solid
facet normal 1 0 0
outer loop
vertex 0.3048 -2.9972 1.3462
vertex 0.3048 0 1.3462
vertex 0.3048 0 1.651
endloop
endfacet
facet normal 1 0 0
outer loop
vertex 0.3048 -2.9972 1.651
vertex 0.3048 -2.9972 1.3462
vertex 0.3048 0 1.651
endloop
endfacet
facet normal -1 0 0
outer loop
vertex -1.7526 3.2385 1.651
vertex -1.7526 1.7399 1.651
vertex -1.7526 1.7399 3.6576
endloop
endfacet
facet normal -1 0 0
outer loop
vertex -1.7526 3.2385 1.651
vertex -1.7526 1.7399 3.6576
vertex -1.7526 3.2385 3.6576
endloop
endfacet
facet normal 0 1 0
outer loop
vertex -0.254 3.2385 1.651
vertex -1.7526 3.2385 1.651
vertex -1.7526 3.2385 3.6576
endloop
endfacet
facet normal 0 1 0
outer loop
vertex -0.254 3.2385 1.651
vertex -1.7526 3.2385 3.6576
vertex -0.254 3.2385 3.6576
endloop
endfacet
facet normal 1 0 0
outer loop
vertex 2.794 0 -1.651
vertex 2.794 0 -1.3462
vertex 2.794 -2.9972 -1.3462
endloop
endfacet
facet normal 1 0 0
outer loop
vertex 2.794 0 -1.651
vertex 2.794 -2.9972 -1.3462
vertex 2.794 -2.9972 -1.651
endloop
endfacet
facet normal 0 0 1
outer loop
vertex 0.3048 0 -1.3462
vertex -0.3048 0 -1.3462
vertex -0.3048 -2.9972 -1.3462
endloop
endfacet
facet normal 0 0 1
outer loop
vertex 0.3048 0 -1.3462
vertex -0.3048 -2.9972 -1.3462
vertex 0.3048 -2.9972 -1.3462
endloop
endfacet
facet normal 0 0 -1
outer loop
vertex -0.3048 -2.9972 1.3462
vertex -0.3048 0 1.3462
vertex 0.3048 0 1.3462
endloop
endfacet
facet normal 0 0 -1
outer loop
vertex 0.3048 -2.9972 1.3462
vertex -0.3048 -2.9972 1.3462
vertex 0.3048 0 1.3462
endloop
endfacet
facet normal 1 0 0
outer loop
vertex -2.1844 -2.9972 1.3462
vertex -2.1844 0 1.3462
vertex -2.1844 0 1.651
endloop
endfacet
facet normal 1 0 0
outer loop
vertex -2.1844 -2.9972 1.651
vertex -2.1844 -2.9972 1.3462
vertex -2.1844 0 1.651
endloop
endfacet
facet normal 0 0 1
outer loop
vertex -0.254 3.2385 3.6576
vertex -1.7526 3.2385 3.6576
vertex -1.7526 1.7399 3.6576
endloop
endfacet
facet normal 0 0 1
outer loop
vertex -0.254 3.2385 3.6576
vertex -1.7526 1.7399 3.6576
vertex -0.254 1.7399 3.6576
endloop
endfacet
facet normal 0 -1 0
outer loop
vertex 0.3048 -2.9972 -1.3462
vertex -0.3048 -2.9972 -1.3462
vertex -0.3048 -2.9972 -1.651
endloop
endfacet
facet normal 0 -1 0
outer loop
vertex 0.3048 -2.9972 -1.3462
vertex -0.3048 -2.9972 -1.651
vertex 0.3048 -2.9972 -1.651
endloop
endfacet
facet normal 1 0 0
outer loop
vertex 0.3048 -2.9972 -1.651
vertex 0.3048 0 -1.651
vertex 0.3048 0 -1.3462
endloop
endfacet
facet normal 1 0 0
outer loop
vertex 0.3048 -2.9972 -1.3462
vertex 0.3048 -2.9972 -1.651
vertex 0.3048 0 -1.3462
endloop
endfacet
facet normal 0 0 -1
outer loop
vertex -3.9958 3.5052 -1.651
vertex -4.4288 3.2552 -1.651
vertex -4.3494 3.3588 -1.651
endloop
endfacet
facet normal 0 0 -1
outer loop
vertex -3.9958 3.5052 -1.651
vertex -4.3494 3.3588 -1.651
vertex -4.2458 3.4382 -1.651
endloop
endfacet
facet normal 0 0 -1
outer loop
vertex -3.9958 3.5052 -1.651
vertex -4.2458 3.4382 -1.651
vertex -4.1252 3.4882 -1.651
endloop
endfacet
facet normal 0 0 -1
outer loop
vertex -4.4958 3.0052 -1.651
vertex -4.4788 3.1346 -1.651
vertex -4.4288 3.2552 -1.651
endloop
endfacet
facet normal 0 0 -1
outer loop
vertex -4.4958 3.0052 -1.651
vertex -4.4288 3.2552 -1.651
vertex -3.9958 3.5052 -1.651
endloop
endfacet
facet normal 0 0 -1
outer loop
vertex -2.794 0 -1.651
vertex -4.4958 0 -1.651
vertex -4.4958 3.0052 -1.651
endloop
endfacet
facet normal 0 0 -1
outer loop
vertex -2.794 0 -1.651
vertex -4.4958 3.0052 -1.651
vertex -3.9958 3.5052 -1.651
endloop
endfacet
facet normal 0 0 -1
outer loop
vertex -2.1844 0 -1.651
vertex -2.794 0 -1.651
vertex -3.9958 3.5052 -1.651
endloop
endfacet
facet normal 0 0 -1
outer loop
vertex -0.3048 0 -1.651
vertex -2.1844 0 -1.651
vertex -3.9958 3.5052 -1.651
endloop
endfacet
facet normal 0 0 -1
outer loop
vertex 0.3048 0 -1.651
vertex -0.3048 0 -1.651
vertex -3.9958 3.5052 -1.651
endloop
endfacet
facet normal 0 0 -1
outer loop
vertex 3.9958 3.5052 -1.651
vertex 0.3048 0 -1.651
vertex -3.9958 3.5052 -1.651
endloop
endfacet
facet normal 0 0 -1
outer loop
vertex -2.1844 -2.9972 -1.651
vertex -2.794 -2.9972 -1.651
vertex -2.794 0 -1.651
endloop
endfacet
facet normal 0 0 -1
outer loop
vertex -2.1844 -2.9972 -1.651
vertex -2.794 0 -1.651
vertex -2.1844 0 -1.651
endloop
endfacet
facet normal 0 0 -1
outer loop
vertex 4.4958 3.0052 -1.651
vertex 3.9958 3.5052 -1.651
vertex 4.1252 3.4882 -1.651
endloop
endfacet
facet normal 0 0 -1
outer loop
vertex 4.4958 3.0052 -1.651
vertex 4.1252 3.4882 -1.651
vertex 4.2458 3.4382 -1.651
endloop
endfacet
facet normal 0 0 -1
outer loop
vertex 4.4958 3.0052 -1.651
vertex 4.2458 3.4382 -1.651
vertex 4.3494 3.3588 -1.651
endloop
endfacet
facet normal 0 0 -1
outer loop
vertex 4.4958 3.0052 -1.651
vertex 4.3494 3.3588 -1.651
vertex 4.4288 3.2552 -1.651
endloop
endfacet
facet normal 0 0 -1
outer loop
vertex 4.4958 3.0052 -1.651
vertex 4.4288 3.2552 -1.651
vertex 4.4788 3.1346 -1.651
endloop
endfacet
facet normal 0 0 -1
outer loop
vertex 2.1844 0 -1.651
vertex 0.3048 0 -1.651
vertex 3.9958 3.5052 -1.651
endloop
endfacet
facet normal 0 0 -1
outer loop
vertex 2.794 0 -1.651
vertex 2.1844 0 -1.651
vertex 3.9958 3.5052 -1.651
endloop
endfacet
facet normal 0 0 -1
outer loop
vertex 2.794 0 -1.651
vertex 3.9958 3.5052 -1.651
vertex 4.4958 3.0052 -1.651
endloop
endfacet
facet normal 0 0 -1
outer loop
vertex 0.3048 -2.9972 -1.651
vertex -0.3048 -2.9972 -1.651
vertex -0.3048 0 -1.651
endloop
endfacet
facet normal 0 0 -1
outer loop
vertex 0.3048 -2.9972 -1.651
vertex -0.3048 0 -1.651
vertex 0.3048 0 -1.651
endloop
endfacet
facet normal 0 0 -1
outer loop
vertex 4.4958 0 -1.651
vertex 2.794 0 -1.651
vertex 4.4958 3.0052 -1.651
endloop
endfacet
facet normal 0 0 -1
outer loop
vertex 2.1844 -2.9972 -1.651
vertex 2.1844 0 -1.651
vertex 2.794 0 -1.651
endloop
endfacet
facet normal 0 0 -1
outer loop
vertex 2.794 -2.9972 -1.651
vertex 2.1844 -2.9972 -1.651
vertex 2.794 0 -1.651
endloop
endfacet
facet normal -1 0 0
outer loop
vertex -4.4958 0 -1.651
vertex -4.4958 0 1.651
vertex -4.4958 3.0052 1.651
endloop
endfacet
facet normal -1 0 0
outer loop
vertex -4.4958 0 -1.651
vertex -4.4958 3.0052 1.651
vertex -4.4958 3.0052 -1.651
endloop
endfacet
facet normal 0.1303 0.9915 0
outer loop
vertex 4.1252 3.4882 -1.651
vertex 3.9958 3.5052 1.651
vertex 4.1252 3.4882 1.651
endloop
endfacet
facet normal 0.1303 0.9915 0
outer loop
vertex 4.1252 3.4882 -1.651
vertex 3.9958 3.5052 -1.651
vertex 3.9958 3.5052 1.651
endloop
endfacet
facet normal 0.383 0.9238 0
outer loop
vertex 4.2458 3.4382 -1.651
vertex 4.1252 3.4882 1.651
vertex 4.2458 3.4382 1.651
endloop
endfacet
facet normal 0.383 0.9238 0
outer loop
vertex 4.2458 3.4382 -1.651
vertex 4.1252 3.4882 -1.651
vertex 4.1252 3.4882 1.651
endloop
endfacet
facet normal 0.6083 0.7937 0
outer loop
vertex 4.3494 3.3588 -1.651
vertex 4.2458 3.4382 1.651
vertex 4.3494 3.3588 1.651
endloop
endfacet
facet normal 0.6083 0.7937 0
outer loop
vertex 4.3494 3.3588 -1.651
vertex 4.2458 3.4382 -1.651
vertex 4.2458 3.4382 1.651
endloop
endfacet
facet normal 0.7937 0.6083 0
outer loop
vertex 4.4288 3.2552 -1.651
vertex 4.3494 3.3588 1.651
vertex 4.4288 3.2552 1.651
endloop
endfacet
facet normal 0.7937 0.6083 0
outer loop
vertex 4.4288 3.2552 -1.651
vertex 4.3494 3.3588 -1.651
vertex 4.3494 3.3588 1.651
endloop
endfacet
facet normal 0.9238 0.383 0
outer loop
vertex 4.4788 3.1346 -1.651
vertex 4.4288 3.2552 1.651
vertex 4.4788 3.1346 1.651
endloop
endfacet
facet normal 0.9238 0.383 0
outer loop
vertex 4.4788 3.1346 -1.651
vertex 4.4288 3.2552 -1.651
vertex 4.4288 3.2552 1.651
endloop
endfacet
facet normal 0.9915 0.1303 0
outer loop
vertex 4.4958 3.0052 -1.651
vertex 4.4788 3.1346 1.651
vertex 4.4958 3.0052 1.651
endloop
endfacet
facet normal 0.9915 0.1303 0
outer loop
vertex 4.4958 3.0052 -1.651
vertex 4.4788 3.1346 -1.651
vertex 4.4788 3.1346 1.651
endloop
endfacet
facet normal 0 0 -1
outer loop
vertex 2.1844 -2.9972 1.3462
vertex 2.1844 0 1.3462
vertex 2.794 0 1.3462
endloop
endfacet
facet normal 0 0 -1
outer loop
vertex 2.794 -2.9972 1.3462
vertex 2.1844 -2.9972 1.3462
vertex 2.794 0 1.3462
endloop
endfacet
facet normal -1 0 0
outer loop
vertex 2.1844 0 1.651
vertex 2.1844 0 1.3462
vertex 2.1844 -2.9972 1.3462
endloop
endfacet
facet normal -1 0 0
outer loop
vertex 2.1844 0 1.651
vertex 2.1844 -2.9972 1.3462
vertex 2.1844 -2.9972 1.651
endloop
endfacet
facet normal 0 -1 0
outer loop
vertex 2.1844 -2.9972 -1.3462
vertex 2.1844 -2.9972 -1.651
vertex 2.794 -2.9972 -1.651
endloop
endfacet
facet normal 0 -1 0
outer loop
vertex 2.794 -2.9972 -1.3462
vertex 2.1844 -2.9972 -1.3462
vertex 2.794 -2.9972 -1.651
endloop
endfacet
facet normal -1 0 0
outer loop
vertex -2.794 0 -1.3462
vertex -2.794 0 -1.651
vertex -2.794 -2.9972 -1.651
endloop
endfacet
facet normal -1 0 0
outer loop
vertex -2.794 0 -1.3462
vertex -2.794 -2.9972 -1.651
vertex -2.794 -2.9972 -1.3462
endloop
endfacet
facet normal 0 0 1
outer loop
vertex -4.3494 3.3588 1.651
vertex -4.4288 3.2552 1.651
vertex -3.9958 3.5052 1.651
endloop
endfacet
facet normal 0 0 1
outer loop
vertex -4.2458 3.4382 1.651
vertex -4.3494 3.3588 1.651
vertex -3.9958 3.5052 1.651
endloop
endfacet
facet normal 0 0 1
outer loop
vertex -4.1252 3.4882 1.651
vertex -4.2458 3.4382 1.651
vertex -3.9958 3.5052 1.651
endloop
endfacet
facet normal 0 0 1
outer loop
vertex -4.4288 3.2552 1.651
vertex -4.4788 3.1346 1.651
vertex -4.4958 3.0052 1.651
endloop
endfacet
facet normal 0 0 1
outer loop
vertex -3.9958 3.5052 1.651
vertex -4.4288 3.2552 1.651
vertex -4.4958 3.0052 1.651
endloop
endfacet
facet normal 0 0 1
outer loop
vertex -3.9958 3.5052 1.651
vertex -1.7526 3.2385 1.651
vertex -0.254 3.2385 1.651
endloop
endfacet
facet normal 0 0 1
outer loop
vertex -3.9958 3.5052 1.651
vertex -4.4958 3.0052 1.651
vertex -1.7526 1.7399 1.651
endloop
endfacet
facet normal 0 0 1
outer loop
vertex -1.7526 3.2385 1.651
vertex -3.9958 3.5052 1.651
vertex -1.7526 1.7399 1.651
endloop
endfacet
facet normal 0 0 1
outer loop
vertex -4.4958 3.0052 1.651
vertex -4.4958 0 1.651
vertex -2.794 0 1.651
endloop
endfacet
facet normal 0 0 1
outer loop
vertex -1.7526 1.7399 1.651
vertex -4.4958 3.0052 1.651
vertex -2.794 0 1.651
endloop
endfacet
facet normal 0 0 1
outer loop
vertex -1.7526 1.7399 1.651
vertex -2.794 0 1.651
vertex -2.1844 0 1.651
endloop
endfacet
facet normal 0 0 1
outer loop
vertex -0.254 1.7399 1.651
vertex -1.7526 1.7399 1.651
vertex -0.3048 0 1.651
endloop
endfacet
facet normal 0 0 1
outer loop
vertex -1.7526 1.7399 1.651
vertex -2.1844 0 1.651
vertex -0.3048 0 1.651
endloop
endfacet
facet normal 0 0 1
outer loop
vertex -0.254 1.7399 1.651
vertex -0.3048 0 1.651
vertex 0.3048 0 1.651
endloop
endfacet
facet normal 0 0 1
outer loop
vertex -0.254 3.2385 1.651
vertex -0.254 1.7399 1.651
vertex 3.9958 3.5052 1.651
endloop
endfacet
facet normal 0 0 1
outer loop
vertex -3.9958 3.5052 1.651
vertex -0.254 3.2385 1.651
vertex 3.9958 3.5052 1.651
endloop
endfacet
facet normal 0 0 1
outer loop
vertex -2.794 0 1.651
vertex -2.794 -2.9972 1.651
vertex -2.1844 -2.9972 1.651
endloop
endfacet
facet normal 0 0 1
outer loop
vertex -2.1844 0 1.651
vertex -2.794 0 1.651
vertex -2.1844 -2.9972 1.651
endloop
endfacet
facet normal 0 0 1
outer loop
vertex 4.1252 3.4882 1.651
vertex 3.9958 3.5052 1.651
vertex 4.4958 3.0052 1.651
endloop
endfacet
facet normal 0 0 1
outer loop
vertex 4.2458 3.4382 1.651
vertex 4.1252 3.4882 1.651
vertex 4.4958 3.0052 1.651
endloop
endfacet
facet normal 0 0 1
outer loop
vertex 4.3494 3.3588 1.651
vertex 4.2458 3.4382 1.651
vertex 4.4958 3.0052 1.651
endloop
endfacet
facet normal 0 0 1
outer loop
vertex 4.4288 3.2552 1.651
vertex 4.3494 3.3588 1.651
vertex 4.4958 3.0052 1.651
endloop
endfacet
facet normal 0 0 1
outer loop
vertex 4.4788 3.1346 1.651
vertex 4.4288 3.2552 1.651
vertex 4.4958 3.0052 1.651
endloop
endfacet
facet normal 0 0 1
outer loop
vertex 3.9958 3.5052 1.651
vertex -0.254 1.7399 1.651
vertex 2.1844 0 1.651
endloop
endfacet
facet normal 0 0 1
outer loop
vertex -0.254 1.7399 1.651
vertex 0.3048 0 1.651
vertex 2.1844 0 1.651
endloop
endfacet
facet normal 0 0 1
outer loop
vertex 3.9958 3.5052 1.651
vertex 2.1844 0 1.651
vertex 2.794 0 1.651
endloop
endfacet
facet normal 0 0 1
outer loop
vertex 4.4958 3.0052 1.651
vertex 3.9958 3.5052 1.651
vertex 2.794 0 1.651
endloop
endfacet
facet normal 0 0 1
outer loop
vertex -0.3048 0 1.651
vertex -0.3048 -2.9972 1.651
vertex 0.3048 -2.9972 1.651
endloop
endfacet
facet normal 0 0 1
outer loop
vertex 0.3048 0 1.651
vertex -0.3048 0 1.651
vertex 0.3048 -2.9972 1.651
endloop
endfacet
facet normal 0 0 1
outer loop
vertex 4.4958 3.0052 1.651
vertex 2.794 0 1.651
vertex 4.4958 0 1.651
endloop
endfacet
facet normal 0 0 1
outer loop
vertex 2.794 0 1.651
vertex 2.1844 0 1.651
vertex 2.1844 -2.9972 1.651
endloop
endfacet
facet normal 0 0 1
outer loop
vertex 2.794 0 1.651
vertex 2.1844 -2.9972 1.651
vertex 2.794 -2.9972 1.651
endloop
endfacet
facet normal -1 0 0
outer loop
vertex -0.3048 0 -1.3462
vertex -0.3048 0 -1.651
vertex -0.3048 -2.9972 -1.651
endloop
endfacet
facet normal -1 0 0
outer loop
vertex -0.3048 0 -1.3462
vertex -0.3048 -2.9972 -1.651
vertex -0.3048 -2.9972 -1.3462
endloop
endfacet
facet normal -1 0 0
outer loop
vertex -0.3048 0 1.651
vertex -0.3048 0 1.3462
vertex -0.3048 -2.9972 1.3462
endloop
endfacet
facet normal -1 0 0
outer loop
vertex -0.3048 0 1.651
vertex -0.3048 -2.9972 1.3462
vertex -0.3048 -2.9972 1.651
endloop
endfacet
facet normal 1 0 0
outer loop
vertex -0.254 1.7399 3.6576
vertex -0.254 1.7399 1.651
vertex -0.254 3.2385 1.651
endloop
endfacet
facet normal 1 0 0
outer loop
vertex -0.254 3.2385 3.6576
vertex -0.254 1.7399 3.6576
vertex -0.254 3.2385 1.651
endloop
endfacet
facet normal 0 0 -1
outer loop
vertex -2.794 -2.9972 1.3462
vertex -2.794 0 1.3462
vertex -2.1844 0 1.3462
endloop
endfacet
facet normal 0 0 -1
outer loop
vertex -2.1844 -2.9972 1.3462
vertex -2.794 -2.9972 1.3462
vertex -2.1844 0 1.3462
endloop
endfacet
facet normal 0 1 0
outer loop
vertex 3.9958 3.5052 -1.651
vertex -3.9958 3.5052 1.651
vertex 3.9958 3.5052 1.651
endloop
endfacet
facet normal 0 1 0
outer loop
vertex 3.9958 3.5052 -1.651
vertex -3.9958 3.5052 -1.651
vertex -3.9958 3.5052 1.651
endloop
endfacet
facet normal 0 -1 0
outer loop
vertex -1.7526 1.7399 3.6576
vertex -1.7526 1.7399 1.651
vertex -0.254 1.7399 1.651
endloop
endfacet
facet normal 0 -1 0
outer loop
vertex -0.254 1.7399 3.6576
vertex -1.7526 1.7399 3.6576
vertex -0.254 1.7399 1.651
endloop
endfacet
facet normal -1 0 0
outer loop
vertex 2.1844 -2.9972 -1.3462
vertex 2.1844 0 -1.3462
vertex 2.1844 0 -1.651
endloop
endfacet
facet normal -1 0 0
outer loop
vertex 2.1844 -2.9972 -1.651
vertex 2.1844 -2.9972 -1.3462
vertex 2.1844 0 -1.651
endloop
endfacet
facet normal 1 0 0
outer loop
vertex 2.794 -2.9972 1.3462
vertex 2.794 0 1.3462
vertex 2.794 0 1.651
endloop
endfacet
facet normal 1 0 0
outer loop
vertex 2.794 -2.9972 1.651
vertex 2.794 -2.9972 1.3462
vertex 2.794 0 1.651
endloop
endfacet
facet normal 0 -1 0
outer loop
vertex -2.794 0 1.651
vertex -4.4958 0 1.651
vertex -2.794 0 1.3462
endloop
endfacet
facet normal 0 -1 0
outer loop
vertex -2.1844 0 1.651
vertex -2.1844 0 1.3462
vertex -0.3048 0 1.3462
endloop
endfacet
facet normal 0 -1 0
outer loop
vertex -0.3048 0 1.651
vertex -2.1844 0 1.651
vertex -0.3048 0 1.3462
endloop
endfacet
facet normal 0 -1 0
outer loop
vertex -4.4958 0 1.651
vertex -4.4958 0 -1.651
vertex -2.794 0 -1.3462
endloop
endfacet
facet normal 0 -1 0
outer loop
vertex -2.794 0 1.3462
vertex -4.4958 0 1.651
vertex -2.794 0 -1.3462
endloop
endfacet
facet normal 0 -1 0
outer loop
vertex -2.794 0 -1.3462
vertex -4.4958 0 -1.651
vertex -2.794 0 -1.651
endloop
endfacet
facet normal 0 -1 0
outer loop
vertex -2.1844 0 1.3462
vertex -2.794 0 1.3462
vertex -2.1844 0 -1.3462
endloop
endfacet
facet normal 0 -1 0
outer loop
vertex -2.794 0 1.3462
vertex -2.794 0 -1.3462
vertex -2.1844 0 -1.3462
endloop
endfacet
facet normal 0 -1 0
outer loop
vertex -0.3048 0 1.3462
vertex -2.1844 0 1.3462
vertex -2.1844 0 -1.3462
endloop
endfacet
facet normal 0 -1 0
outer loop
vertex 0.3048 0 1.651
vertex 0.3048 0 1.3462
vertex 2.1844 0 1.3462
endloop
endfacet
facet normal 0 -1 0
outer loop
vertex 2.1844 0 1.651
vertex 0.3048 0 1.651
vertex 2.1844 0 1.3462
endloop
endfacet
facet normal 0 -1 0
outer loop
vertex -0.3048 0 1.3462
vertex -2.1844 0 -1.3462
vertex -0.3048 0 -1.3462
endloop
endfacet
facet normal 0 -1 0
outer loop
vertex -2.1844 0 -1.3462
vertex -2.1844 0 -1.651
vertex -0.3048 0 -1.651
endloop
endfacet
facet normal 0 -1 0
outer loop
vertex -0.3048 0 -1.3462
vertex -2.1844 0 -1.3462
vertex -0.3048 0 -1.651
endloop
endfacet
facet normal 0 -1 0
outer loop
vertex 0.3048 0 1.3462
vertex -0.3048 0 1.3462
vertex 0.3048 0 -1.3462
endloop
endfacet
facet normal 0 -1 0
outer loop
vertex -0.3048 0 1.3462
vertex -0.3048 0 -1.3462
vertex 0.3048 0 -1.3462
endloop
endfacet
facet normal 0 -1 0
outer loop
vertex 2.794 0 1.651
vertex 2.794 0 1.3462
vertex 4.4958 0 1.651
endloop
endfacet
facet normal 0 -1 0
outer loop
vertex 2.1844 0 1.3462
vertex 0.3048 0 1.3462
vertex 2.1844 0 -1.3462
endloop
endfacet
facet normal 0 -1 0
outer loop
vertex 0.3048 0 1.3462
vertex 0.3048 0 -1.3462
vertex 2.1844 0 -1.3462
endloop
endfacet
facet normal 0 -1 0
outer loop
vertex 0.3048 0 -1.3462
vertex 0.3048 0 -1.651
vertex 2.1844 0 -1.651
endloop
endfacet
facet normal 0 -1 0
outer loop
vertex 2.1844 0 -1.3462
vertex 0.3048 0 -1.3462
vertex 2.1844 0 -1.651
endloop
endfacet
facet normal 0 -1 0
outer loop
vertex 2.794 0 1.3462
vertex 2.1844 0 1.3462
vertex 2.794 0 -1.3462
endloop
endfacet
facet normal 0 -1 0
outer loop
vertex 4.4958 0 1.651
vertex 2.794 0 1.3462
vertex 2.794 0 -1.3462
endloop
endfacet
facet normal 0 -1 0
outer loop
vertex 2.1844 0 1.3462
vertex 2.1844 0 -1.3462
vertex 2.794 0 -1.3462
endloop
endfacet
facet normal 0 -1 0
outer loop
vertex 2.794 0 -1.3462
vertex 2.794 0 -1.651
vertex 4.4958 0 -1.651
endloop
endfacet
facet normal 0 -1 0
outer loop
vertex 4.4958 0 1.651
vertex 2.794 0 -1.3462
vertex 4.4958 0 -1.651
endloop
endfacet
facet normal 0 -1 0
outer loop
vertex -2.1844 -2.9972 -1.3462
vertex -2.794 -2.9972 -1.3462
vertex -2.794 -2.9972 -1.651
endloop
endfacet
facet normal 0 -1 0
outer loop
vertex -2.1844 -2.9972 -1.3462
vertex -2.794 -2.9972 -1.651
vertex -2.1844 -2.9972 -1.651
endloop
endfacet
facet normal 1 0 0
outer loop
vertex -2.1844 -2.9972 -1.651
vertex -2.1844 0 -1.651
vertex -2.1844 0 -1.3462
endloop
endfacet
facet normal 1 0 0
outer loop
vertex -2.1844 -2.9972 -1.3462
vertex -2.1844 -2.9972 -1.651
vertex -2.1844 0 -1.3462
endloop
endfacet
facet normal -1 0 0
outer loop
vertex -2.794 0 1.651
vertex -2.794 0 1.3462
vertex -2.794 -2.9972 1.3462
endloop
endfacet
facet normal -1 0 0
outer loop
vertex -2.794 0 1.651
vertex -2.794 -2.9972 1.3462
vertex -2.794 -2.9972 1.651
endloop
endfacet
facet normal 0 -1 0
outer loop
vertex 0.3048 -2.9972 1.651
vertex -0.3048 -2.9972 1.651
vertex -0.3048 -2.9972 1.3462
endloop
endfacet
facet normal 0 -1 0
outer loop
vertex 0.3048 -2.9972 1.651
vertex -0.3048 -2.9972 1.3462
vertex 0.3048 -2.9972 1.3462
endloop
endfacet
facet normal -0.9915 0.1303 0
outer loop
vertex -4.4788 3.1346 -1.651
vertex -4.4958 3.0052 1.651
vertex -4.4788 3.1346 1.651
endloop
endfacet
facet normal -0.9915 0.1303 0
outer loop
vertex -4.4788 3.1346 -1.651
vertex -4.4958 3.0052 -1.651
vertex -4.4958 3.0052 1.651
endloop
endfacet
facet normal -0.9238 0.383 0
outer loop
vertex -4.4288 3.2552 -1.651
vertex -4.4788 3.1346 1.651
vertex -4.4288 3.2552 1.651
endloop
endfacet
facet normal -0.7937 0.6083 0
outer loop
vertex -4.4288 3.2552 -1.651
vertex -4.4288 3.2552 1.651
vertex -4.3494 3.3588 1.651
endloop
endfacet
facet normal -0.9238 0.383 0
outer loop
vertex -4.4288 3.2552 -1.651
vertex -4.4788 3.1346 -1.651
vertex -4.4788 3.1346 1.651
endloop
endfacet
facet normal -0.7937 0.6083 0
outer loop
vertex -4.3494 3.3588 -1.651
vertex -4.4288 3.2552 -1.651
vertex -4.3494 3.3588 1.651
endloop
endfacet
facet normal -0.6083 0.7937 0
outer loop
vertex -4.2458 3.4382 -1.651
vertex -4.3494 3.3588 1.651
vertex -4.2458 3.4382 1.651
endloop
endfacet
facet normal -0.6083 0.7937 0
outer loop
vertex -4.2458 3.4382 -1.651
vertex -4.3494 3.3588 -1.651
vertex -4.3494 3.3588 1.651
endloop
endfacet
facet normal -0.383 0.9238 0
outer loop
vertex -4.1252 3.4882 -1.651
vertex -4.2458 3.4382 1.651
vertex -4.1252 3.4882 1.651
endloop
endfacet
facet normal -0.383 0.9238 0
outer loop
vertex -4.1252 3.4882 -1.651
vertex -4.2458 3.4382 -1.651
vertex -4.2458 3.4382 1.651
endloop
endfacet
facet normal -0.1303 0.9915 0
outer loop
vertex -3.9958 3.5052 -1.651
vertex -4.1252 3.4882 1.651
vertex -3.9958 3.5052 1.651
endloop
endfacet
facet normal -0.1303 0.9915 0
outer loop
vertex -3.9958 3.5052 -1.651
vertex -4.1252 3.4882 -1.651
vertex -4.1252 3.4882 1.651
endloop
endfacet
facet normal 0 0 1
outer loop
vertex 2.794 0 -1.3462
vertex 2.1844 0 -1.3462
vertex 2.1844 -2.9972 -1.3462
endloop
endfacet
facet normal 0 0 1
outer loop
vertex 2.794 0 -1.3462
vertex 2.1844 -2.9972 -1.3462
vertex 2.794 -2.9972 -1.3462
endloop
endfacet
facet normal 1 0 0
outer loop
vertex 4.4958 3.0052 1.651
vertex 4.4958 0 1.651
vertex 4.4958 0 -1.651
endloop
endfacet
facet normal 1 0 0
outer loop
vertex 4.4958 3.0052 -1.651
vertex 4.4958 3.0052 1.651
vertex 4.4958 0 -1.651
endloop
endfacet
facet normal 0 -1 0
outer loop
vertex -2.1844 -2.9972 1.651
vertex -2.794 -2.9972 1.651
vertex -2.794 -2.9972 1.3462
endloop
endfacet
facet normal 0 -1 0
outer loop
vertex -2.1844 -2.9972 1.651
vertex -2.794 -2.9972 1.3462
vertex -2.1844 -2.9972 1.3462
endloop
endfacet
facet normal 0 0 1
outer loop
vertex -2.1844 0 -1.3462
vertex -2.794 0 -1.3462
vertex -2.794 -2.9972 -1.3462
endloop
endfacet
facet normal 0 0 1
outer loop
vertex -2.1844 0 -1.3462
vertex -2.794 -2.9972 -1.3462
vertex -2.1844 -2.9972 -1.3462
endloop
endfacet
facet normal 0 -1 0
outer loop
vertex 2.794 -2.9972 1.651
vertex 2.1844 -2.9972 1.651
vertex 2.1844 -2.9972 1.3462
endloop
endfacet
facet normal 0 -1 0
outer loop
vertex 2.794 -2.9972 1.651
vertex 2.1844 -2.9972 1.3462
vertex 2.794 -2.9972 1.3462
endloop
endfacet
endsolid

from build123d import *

# Parameters (mm, degrees)
SKETCH1_W               = 8.9916
SKETCH1_H               = 3.302
BOSS_EXTRUDE1_DEPTH     = 3.5052
SKETCH2_W               = 1.4986
SKETCH2_H               = 1.4986
BOSS_EXTRUDE2_DEPTH     = 2.0066
FILLET1_R               = 0.5
SKETCH3_W               = 0.6096
SKETCH3_H               = 0.3048
BOSS_EXTRUDE3_DEPTH     = 2.9972
LPATTERN1_COUNT         = 3
LPATTERN1_PITCH         = 2.4892
MIRROR6_COPY_1_SKETCH_W = 0.6096
MIRROR6_COPY_1_SKETCH_H = 0.3048
MIRROR6_COPY_1_DEPTH    = 2.9972
MIRROR6_COPY_2_SKETCH_W = 0.6096
MIRROR6_COPY_2_SKETCH_H = 0.3048
MIRROR6_COPY_2_DEPTH    = 2.9972


with BuildPart() as part:
    # Sketch1 → Boss-Extrude1 (new body)
    with BuildSketch(Plane(origin=(0, 0, 0), x_dir=(1, 0, 0), z_dir=(0, 1, 0))):
        Rectangle(SKETCH1_W, SKETCH1_H)
    extrude(amount=BOSS_EXTRUDE1_DEPTH)

    # Sketch2 → Boss-Extrude2 (add)
    with BuildSketch(Plane.XY.offset(1.651)):
        with Locations((-1.0033, 2.4892)):
            Rectangle(SKETCH2_W, SKETCH2_H)
    extrude(amount=BOSS_EXTRUDE2_DEPTH)

    # Fillet1
    fillet1_edges = [part.edges().sort_by_distance(p)[0] for p in [
        (4.4958, 3.5052, 0),
        (-4.4958, 3.5052, 0),
    ]]
    fillet(fillet1_edges, radius=FILLET1_R)

    # Sketch3 → Boss-Extrude3 (add)
    with BuildSketch(Plane.XZ):
        with Locations((2.4892, 1.4986)):
            Rectangle(SKETCH3_W, SKETCH3_H)
    boss_extrude3 = extrude(amount=BOSS_EXTRUDE3_DEPTH)

    # LPattern1: Boss-Extrude3 ×3
    with Locations(*[(-i * LPATTERN1_PITCH, 0, 0) for i in range(1, LPATTERN1_COUNT)]):
        add(boss_extrude3)

    # Mirror6: Boss-Extrude3 across plane
    add(boss_extrude3.mirror(Plane.XY))

    # Mirror6 copy 1 sketch → Mirror6 copy 1 (add)
    with BuildSketch(Plane(origin=(-2.4892, 0, 0), x_dir=(1, 0, 0), z_dir=(0, -1, 0))):
        with Locations((2.4892, -1.4986)):
            Rectangle(MIRROR6_COPY_1_SKETCH_W, MIRROR6_COPY_1_SKETCH_H)
    extrude(amount=MIRROR6_COPY_1_DEPTH)

    # Mirror6 copy 2 sketch → Mirror6 copy 2 (add)
    with BuildSketch(Plane(origin=(-4.9784, 0, 0), x_dir=(1, 0, 0), z_dir=(0, -1, 0))):
        with Locations((2.4892, -1.4986)):
            Rectangle(MIRROR6_COPY_2_SKETCH_W, MIRROR6_COPY_2_SKETCH_H)
    extrude(amount=MIRROR6_COPY_2_DEPTH)


solid = part.part
